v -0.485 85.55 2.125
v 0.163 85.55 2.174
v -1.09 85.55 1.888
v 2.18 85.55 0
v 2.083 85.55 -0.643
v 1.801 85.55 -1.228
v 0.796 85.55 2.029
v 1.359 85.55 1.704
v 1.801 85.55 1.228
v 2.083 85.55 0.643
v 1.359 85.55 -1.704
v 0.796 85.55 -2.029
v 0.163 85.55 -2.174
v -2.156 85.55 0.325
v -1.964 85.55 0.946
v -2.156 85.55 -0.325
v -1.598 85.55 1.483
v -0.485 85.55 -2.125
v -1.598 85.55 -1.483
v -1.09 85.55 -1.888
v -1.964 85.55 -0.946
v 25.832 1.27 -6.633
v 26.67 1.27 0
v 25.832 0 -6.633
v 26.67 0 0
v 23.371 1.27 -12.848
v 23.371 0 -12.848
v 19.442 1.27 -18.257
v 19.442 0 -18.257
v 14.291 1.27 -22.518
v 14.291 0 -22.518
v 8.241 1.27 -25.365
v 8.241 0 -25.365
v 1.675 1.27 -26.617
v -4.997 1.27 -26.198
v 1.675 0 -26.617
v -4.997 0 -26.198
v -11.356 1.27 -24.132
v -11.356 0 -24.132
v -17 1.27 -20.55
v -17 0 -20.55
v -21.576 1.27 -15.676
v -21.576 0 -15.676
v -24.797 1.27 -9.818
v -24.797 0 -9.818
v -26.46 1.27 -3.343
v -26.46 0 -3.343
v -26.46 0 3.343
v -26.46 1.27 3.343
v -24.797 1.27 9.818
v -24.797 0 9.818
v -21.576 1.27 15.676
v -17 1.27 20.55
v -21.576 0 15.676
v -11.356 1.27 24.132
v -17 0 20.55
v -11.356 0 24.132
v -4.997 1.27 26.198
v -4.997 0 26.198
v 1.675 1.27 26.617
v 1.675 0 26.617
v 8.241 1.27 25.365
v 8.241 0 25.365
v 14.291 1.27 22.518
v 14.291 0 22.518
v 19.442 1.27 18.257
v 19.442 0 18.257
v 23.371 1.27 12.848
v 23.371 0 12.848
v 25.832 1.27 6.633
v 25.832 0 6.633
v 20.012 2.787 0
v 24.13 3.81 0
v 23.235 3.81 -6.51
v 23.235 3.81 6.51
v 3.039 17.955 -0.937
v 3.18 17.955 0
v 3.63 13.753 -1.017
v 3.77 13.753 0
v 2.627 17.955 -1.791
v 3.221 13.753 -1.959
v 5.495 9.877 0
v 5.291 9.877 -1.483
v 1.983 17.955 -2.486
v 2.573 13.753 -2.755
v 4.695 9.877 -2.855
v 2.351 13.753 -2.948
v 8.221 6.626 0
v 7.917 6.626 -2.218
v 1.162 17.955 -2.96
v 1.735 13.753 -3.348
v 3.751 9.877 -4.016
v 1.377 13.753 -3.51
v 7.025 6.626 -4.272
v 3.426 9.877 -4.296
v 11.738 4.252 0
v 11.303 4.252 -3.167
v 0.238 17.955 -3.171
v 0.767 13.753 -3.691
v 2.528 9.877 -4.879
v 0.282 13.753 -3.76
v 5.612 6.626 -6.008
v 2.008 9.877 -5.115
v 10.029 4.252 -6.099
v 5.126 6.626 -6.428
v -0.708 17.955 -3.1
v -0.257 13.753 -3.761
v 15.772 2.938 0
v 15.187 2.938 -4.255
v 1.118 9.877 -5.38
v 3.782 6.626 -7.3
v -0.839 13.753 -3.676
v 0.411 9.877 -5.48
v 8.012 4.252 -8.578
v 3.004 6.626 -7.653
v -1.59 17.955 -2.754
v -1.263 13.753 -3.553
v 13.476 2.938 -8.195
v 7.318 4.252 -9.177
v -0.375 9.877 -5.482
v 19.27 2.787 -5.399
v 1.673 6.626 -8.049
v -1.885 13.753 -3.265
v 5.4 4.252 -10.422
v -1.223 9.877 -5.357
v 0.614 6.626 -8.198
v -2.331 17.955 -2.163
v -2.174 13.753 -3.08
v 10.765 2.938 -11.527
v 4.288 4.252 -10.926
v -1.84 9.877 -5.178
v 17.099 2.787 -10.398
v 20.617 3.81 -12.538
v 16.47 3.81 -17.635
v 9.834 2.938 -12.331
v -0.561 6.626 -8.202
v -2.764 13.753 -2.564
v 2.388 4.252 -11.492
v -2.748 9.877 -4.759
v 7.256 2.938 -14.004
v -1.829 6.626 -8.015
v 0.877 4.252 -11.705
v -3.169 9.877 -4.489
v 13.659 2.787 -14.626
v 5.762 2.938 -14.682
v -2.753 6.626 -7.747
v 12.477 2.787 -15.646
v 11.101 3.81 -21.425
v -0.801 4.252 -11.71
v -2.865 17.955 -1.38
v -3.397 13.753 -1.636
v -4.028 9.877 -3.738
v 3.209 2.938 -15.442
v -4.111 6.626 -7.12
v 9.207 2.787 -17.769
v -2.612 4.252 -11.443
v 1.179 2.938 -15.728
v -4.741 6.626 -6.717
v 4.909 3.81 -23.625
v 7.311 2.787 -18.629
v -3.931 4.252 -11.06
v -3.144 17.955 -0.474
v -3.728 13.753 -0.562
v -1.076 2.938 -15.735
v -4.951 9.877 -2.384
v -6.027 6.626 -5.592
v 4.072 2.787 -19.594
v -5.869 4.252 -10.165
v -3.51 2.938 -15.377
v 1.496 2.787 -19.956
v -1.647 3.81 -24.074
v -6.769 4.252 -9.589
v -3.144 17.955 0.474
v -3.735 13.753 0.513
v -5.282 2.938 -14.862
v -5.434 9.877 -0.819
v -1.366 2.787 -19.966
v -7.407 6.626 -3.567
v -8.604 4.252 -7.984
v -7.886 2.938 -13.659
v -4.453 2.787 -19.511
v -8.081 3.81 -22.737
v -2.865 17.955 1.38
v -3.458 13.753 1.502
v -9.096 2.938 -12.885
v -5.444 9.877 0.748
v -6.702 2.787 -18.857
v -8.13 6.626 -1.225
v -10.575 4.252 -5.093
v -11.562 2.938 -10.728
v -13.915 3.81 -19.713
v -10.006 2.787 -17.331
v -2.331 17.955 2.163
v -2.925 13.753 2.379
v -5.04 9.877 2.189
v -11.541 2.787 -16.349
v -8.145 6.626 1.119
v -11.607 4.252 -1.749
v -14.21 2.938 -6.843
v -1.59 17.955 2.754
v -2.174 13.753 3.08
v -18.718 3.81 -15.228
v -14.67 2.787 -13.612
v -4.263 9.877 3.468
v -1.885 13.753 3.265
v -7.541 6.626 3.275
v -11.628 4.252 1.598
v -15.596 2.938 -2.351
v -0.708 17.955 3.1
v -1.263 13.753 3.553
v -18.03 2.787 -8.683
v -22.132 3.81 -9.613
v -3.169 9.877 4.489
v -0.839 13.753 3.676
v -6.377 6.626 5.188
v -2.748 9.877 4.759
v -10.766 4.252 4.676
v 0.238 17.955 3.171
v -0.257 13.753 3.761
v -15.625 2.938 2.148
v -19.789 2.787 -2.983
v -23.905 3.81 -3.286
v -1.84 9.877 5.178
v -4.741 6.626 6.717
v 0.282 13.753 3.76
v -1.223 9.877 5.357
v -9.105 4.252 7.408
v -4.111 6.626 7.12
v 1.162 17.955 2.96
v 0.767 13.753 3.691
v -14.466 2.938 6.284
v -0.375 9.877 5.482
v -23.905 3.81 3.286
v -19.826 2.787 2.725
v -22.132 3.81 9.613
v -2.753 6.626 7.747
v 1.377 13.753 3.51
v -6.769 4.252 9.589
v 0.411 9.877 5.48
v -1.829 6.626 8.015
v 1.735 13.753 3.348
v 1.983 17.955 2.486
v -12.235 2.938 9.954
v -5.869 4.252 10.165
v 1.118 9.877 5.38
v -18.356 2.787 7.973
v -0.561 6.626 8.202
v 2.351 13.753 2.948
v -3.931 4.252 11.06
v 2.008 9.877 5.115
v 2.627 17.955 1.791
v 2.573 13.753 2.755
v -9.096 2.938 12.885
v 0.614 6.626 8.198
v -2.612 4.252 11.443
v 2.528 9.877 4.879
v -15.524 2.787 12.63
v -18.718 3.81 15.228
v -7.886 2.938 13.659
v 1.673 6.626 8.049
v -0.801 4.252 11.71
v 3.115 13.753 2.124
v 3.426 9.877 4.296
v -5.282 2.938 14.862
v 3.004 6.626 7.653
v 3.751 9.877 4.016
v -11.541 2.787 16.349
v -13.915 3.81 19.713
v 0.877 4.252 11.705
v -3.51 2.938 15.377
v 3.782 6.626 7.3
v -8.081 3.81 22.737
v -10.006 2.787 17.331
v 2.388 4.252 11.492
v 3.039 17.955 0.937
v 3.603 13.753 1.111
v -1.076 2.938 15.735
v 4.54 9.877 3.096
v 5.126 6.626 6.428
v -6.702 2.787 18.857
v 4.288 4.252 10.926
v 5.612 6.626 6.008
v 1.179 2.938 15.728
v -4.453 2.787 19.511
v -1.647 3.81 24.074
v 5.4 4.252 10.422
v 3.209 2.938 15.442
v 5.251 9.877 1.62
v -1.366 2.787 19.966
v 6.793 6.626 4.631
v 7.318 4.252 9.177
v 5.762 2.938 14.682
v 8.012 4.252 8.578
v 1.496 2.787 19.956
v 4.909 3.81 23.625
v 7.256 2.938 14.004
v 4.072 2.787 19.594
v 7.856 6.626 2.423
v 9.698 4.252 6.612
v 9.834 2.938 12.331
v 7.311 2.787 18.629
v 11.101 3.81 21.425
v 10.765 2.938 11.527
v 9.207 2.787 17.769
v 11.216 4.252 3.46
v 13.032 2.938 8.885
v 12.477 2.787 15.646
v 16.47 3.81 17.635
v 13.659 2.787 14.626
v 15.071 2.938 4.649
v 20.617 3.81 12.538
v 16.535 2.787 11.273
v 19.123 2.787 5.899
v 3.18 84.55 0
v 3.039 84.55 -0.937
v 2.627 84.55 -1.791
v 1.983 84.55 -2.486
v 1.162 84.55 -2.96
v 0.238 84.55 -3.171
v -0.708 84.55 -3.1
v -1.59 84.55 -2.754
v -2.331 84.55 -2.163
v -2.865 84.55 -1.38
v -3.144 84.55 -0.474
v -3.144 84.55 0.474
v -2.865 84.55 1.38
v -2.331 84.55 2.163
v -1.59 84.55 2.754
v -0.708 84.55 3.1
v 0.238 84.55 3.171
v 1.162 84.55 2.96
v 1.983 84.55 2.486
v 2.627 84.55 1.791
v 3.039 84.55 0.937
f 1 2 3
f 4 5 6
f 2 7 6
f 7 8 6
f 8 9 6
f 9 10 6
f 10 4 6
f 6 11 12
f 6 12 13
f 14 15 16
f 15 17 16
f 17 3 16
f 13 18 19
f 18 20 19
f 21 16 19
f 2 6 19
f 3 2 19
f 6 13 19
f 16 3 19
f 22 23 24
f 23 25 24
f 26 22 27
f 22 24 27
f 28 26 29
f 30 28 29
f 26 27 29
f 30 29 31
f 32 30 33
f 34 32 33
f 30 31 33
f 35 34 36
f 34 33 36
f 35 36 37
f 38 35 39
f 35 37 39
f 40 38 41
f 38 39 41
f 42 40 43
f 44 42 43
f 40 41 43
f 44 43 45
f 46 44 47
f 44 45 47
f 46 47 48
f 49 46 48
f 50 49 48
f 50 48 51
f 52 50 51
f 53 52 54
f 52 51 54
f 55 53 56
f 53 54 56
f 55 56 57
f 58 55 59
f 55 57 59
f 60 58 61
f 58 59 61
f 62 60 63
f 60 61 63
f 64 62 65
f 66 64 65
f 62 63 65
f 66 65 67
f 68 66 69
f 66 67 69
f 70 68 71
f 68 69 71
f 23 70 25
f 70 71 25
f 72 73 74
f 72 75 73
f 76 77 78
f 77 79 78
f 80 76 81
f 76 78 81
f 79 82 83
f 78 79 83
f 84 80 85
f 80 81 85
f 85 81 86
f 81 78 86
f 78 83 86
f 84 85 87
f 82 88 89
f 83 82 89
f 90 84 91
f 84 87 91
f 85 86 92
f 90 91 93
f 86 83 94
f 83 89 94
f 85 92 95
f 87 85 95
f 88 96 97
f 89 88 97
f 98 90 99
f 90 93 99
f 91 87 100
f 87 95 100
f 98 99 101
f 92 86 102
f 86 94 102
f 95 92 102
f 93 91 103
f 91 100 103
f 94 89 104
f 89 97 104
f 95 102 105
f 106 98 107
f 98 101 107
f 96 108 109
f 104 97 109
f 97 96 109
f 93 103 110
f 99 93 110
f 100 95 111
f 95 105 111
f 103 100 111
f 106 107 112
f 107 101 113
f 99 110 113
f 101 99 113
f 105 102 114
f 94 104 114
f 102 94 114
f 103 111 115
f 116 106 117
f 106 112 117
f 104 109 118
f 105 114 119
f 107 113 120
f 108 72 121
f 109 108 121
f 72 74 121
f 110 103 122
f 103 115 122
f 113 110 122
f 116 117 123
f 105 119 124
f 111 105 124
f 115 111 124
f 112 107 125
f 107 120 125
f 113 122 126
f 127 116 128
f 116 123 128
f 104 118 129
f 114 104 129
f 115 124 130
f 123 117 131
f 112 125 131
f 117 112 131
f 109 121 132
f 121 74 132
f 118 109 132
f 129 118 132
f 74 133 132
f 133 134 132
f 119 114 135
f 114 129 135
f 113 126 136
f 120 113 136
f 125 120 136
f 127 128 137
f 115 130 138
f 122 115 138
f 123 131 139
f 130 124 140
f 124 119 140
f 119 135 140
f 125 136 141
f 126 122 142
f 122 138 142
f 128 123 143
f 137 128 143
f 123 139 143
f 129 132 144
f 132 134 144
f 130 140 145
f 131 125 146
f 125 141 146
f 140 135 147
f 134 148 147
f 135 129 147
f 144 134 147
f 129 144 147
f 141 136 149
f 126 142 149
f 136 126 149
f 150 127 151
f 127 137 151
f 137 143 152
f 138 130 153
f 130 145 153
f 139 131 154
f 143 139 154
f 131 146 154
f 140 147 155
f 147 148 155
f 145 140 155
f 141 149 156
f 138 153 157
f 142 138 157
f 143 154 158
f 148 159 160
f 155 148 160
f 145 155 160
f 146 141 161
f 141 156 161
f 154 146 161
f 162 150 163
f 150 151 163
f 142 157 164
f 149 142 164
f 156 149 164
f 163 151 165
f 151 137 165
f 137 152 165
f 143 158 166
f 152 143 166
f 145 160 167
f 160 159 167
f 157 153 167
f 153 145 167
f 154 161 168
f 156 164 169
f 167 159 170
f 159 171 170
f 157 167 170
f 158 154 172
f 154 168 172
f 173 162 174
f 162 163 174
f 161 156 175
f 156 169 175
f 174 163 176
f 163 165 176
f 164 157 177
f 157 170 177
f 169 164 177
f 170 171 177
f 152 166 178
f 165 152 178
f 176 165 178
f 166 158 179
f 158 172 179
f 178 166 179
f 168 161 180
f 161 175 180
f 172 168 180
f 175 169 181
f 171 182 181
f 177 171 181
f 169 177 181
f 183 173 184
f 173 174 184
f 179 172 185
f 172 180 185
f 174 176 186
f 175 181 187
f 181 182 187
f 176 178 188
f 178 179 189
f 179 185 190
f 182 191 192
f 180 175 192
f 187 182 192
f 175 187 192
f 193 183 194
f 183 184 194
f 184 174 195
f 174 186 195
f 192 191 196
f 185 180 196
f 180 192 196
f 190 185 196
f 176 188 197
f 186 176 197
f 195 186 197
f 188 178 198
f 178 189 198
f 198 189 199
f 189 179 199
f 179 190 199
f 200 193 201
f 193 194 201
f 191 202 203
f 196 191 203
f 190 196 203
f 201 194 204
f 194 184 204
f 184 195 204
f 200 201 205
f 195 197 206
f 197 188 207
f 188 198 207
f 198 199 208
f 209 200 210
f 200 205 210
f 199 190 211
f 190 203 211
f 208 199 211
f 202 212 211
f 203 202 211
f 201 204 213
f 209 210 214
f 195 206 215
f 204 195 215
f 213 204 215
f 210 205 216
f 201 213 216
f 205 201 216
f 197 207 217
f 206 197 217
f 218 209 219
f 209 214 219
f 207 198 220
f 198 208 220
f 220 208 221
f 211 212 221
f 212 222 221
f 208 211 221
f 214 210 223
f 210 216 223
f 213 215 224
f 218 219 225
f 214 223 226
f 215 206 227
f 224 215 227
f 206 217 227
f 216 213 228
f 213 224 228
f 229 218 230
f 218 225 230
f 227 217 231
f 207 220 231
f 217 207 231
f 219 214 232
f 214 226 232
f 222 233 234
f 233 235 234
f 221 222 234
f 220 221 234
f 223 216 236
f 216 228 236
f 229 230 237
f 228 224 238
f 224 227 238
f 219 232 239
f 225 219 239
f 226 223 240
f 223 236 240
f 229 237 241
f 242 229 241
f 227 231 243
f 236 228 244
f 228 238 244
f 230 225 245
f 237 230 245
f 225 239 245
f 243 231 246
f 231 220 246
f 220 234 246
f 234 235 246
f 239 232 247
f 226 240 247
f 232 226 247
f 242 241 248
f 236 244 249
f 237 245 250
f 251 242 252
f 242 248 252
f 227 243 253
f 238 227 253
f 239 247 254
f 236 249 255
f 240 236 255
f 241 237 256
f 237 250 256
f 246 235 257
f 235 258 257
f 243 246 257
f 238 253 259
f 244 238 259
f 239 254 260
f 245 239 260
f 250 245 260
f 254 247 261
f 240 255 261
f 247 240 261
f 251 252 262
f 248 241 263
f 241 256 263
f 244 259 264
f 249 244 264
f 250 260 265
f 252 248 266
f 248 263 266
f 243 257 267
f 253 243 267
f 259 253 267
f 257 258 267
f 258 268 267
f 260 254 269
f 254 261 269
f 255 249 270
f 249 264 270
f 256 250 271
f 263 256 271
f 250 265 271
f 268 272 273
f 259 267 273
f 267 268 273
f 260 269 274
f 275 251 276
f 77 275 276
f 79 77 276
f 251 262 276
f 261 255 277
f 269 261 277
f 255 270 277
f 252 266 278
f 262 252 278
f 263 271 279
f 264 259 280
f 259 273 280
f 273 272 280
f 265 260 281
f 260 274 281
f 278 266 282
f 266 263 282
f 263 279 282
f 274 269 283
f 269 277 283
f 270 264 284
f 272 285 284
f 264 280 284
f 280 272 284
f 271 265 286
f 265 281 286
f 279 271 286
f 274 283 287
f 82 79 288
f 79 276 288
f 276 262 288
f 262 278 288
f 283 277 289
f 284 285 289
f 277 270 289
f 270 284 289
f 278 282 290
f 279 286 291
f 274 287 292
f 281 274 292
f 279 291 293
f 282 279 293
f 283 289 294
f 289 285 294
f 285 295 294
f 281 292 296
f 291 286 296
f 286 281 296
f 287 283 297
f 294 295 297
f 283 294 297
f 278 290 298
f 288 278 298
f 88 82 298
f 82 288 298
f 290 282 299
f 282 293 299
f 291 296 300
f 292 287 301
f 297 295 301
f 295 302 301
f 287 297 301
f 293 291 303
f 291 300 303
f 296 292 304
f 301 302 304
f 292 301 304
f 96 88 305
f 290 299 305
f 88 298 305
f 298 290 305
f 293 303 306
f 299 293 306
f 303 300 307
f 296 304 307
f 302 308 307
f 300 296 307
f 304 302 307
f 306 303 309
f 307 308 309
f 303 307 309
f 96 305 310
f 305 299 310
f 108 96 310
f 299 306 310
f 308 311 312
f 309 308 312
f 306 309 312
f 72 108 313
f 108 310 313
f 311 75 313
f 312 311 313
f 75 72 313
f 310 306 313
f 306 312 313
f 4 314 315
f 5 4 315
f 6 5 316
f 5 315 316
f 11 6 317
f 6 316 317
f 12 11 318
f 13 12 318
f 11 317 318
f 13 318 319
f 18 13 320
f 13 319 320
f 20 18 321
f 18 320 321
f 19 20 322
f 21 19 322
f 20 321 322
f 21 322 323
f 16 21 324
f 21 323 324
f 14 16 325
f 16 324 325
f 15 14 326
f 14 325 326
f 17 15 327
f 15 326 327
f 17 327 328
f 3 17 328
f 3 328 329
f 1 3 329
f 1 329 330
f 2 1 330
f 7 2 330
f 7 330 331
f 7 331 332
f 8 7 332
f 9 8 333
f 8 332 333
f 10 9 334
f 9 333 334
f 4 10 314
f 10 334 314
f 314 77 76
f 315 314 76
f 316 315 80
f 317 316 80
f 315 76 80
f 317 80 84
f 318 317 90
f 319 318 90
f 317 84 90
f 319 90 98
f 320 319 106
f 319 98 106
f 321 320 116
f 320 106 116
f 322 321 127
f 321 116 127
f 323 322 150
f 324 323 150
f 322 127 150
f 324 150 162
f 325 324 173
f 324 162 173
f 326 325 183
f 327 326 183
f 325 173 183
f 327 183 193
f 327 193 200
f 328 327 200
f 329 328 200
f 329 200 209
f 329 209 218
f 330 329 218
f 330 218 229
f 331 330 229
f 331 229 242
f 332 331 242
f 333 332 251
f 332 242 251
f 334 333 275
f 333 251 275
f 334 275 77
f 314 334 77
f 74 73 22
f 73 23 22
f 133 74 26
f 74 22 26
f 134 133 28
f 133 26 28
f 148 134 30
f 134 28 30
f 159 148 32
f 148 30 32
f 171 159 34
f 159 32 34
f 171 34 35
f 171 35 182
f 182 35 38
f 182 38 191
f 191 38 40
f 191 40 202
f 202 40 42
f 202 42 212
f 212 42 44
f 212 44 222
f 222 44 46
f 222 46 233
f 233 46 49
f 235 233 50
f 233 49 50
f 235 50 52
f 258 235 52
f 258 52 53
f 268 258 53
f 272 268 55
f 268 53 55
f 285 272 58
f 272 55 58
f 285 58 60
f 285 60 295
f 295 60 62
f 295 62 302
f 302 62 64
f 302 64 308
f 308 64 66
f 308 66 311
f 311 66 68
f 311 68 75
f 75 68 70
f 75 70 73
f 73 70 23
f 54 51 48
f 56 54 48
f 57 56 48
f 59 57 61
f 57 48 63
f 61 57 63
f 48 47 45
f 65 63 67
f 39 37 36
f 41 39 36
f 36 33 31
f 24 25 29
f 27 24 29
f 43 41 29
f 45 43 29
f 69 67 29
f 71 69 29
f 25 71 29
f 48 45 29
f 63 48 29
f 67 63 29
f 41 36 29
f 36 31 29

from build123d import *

# Parameters (mm, degrees)
CHAMFER1_SIZE = 1


with BuildPart() as part:
    # Sketch1 → Revolve1 (revolve)
    with BuildSketch(Plane.XY):
        with BuildLine():
            Line((0, 0), (0, 85.55))
            Line((0, 85.55), (3.18, 85.55))
            Line((3.18, 85.55), (3.18, 17.954698654))
            ThreePointArc((3.18, 17.954698654), (9.896609701, 5.315721242), (24.13, 3.81))
            Line((24.13, 3.81), (26.67, 1.27))
            Line((26.67, 1.27), (26.67, 0))
            Line((26.67, 0), (0, 0))
        make_face()
    revolve(axis=Axis((0, 0, 0), (0, 1, 0)))

    # Chamfer1
    chamfer1_edges = [part.edges().sort_by_distance(p)[0] for p in [
        (-3.18, 85.55, 0),
    ]]
    chamfer(chamfer1_edges, length=CHAMFER1_SIZE)


solid = part.part
